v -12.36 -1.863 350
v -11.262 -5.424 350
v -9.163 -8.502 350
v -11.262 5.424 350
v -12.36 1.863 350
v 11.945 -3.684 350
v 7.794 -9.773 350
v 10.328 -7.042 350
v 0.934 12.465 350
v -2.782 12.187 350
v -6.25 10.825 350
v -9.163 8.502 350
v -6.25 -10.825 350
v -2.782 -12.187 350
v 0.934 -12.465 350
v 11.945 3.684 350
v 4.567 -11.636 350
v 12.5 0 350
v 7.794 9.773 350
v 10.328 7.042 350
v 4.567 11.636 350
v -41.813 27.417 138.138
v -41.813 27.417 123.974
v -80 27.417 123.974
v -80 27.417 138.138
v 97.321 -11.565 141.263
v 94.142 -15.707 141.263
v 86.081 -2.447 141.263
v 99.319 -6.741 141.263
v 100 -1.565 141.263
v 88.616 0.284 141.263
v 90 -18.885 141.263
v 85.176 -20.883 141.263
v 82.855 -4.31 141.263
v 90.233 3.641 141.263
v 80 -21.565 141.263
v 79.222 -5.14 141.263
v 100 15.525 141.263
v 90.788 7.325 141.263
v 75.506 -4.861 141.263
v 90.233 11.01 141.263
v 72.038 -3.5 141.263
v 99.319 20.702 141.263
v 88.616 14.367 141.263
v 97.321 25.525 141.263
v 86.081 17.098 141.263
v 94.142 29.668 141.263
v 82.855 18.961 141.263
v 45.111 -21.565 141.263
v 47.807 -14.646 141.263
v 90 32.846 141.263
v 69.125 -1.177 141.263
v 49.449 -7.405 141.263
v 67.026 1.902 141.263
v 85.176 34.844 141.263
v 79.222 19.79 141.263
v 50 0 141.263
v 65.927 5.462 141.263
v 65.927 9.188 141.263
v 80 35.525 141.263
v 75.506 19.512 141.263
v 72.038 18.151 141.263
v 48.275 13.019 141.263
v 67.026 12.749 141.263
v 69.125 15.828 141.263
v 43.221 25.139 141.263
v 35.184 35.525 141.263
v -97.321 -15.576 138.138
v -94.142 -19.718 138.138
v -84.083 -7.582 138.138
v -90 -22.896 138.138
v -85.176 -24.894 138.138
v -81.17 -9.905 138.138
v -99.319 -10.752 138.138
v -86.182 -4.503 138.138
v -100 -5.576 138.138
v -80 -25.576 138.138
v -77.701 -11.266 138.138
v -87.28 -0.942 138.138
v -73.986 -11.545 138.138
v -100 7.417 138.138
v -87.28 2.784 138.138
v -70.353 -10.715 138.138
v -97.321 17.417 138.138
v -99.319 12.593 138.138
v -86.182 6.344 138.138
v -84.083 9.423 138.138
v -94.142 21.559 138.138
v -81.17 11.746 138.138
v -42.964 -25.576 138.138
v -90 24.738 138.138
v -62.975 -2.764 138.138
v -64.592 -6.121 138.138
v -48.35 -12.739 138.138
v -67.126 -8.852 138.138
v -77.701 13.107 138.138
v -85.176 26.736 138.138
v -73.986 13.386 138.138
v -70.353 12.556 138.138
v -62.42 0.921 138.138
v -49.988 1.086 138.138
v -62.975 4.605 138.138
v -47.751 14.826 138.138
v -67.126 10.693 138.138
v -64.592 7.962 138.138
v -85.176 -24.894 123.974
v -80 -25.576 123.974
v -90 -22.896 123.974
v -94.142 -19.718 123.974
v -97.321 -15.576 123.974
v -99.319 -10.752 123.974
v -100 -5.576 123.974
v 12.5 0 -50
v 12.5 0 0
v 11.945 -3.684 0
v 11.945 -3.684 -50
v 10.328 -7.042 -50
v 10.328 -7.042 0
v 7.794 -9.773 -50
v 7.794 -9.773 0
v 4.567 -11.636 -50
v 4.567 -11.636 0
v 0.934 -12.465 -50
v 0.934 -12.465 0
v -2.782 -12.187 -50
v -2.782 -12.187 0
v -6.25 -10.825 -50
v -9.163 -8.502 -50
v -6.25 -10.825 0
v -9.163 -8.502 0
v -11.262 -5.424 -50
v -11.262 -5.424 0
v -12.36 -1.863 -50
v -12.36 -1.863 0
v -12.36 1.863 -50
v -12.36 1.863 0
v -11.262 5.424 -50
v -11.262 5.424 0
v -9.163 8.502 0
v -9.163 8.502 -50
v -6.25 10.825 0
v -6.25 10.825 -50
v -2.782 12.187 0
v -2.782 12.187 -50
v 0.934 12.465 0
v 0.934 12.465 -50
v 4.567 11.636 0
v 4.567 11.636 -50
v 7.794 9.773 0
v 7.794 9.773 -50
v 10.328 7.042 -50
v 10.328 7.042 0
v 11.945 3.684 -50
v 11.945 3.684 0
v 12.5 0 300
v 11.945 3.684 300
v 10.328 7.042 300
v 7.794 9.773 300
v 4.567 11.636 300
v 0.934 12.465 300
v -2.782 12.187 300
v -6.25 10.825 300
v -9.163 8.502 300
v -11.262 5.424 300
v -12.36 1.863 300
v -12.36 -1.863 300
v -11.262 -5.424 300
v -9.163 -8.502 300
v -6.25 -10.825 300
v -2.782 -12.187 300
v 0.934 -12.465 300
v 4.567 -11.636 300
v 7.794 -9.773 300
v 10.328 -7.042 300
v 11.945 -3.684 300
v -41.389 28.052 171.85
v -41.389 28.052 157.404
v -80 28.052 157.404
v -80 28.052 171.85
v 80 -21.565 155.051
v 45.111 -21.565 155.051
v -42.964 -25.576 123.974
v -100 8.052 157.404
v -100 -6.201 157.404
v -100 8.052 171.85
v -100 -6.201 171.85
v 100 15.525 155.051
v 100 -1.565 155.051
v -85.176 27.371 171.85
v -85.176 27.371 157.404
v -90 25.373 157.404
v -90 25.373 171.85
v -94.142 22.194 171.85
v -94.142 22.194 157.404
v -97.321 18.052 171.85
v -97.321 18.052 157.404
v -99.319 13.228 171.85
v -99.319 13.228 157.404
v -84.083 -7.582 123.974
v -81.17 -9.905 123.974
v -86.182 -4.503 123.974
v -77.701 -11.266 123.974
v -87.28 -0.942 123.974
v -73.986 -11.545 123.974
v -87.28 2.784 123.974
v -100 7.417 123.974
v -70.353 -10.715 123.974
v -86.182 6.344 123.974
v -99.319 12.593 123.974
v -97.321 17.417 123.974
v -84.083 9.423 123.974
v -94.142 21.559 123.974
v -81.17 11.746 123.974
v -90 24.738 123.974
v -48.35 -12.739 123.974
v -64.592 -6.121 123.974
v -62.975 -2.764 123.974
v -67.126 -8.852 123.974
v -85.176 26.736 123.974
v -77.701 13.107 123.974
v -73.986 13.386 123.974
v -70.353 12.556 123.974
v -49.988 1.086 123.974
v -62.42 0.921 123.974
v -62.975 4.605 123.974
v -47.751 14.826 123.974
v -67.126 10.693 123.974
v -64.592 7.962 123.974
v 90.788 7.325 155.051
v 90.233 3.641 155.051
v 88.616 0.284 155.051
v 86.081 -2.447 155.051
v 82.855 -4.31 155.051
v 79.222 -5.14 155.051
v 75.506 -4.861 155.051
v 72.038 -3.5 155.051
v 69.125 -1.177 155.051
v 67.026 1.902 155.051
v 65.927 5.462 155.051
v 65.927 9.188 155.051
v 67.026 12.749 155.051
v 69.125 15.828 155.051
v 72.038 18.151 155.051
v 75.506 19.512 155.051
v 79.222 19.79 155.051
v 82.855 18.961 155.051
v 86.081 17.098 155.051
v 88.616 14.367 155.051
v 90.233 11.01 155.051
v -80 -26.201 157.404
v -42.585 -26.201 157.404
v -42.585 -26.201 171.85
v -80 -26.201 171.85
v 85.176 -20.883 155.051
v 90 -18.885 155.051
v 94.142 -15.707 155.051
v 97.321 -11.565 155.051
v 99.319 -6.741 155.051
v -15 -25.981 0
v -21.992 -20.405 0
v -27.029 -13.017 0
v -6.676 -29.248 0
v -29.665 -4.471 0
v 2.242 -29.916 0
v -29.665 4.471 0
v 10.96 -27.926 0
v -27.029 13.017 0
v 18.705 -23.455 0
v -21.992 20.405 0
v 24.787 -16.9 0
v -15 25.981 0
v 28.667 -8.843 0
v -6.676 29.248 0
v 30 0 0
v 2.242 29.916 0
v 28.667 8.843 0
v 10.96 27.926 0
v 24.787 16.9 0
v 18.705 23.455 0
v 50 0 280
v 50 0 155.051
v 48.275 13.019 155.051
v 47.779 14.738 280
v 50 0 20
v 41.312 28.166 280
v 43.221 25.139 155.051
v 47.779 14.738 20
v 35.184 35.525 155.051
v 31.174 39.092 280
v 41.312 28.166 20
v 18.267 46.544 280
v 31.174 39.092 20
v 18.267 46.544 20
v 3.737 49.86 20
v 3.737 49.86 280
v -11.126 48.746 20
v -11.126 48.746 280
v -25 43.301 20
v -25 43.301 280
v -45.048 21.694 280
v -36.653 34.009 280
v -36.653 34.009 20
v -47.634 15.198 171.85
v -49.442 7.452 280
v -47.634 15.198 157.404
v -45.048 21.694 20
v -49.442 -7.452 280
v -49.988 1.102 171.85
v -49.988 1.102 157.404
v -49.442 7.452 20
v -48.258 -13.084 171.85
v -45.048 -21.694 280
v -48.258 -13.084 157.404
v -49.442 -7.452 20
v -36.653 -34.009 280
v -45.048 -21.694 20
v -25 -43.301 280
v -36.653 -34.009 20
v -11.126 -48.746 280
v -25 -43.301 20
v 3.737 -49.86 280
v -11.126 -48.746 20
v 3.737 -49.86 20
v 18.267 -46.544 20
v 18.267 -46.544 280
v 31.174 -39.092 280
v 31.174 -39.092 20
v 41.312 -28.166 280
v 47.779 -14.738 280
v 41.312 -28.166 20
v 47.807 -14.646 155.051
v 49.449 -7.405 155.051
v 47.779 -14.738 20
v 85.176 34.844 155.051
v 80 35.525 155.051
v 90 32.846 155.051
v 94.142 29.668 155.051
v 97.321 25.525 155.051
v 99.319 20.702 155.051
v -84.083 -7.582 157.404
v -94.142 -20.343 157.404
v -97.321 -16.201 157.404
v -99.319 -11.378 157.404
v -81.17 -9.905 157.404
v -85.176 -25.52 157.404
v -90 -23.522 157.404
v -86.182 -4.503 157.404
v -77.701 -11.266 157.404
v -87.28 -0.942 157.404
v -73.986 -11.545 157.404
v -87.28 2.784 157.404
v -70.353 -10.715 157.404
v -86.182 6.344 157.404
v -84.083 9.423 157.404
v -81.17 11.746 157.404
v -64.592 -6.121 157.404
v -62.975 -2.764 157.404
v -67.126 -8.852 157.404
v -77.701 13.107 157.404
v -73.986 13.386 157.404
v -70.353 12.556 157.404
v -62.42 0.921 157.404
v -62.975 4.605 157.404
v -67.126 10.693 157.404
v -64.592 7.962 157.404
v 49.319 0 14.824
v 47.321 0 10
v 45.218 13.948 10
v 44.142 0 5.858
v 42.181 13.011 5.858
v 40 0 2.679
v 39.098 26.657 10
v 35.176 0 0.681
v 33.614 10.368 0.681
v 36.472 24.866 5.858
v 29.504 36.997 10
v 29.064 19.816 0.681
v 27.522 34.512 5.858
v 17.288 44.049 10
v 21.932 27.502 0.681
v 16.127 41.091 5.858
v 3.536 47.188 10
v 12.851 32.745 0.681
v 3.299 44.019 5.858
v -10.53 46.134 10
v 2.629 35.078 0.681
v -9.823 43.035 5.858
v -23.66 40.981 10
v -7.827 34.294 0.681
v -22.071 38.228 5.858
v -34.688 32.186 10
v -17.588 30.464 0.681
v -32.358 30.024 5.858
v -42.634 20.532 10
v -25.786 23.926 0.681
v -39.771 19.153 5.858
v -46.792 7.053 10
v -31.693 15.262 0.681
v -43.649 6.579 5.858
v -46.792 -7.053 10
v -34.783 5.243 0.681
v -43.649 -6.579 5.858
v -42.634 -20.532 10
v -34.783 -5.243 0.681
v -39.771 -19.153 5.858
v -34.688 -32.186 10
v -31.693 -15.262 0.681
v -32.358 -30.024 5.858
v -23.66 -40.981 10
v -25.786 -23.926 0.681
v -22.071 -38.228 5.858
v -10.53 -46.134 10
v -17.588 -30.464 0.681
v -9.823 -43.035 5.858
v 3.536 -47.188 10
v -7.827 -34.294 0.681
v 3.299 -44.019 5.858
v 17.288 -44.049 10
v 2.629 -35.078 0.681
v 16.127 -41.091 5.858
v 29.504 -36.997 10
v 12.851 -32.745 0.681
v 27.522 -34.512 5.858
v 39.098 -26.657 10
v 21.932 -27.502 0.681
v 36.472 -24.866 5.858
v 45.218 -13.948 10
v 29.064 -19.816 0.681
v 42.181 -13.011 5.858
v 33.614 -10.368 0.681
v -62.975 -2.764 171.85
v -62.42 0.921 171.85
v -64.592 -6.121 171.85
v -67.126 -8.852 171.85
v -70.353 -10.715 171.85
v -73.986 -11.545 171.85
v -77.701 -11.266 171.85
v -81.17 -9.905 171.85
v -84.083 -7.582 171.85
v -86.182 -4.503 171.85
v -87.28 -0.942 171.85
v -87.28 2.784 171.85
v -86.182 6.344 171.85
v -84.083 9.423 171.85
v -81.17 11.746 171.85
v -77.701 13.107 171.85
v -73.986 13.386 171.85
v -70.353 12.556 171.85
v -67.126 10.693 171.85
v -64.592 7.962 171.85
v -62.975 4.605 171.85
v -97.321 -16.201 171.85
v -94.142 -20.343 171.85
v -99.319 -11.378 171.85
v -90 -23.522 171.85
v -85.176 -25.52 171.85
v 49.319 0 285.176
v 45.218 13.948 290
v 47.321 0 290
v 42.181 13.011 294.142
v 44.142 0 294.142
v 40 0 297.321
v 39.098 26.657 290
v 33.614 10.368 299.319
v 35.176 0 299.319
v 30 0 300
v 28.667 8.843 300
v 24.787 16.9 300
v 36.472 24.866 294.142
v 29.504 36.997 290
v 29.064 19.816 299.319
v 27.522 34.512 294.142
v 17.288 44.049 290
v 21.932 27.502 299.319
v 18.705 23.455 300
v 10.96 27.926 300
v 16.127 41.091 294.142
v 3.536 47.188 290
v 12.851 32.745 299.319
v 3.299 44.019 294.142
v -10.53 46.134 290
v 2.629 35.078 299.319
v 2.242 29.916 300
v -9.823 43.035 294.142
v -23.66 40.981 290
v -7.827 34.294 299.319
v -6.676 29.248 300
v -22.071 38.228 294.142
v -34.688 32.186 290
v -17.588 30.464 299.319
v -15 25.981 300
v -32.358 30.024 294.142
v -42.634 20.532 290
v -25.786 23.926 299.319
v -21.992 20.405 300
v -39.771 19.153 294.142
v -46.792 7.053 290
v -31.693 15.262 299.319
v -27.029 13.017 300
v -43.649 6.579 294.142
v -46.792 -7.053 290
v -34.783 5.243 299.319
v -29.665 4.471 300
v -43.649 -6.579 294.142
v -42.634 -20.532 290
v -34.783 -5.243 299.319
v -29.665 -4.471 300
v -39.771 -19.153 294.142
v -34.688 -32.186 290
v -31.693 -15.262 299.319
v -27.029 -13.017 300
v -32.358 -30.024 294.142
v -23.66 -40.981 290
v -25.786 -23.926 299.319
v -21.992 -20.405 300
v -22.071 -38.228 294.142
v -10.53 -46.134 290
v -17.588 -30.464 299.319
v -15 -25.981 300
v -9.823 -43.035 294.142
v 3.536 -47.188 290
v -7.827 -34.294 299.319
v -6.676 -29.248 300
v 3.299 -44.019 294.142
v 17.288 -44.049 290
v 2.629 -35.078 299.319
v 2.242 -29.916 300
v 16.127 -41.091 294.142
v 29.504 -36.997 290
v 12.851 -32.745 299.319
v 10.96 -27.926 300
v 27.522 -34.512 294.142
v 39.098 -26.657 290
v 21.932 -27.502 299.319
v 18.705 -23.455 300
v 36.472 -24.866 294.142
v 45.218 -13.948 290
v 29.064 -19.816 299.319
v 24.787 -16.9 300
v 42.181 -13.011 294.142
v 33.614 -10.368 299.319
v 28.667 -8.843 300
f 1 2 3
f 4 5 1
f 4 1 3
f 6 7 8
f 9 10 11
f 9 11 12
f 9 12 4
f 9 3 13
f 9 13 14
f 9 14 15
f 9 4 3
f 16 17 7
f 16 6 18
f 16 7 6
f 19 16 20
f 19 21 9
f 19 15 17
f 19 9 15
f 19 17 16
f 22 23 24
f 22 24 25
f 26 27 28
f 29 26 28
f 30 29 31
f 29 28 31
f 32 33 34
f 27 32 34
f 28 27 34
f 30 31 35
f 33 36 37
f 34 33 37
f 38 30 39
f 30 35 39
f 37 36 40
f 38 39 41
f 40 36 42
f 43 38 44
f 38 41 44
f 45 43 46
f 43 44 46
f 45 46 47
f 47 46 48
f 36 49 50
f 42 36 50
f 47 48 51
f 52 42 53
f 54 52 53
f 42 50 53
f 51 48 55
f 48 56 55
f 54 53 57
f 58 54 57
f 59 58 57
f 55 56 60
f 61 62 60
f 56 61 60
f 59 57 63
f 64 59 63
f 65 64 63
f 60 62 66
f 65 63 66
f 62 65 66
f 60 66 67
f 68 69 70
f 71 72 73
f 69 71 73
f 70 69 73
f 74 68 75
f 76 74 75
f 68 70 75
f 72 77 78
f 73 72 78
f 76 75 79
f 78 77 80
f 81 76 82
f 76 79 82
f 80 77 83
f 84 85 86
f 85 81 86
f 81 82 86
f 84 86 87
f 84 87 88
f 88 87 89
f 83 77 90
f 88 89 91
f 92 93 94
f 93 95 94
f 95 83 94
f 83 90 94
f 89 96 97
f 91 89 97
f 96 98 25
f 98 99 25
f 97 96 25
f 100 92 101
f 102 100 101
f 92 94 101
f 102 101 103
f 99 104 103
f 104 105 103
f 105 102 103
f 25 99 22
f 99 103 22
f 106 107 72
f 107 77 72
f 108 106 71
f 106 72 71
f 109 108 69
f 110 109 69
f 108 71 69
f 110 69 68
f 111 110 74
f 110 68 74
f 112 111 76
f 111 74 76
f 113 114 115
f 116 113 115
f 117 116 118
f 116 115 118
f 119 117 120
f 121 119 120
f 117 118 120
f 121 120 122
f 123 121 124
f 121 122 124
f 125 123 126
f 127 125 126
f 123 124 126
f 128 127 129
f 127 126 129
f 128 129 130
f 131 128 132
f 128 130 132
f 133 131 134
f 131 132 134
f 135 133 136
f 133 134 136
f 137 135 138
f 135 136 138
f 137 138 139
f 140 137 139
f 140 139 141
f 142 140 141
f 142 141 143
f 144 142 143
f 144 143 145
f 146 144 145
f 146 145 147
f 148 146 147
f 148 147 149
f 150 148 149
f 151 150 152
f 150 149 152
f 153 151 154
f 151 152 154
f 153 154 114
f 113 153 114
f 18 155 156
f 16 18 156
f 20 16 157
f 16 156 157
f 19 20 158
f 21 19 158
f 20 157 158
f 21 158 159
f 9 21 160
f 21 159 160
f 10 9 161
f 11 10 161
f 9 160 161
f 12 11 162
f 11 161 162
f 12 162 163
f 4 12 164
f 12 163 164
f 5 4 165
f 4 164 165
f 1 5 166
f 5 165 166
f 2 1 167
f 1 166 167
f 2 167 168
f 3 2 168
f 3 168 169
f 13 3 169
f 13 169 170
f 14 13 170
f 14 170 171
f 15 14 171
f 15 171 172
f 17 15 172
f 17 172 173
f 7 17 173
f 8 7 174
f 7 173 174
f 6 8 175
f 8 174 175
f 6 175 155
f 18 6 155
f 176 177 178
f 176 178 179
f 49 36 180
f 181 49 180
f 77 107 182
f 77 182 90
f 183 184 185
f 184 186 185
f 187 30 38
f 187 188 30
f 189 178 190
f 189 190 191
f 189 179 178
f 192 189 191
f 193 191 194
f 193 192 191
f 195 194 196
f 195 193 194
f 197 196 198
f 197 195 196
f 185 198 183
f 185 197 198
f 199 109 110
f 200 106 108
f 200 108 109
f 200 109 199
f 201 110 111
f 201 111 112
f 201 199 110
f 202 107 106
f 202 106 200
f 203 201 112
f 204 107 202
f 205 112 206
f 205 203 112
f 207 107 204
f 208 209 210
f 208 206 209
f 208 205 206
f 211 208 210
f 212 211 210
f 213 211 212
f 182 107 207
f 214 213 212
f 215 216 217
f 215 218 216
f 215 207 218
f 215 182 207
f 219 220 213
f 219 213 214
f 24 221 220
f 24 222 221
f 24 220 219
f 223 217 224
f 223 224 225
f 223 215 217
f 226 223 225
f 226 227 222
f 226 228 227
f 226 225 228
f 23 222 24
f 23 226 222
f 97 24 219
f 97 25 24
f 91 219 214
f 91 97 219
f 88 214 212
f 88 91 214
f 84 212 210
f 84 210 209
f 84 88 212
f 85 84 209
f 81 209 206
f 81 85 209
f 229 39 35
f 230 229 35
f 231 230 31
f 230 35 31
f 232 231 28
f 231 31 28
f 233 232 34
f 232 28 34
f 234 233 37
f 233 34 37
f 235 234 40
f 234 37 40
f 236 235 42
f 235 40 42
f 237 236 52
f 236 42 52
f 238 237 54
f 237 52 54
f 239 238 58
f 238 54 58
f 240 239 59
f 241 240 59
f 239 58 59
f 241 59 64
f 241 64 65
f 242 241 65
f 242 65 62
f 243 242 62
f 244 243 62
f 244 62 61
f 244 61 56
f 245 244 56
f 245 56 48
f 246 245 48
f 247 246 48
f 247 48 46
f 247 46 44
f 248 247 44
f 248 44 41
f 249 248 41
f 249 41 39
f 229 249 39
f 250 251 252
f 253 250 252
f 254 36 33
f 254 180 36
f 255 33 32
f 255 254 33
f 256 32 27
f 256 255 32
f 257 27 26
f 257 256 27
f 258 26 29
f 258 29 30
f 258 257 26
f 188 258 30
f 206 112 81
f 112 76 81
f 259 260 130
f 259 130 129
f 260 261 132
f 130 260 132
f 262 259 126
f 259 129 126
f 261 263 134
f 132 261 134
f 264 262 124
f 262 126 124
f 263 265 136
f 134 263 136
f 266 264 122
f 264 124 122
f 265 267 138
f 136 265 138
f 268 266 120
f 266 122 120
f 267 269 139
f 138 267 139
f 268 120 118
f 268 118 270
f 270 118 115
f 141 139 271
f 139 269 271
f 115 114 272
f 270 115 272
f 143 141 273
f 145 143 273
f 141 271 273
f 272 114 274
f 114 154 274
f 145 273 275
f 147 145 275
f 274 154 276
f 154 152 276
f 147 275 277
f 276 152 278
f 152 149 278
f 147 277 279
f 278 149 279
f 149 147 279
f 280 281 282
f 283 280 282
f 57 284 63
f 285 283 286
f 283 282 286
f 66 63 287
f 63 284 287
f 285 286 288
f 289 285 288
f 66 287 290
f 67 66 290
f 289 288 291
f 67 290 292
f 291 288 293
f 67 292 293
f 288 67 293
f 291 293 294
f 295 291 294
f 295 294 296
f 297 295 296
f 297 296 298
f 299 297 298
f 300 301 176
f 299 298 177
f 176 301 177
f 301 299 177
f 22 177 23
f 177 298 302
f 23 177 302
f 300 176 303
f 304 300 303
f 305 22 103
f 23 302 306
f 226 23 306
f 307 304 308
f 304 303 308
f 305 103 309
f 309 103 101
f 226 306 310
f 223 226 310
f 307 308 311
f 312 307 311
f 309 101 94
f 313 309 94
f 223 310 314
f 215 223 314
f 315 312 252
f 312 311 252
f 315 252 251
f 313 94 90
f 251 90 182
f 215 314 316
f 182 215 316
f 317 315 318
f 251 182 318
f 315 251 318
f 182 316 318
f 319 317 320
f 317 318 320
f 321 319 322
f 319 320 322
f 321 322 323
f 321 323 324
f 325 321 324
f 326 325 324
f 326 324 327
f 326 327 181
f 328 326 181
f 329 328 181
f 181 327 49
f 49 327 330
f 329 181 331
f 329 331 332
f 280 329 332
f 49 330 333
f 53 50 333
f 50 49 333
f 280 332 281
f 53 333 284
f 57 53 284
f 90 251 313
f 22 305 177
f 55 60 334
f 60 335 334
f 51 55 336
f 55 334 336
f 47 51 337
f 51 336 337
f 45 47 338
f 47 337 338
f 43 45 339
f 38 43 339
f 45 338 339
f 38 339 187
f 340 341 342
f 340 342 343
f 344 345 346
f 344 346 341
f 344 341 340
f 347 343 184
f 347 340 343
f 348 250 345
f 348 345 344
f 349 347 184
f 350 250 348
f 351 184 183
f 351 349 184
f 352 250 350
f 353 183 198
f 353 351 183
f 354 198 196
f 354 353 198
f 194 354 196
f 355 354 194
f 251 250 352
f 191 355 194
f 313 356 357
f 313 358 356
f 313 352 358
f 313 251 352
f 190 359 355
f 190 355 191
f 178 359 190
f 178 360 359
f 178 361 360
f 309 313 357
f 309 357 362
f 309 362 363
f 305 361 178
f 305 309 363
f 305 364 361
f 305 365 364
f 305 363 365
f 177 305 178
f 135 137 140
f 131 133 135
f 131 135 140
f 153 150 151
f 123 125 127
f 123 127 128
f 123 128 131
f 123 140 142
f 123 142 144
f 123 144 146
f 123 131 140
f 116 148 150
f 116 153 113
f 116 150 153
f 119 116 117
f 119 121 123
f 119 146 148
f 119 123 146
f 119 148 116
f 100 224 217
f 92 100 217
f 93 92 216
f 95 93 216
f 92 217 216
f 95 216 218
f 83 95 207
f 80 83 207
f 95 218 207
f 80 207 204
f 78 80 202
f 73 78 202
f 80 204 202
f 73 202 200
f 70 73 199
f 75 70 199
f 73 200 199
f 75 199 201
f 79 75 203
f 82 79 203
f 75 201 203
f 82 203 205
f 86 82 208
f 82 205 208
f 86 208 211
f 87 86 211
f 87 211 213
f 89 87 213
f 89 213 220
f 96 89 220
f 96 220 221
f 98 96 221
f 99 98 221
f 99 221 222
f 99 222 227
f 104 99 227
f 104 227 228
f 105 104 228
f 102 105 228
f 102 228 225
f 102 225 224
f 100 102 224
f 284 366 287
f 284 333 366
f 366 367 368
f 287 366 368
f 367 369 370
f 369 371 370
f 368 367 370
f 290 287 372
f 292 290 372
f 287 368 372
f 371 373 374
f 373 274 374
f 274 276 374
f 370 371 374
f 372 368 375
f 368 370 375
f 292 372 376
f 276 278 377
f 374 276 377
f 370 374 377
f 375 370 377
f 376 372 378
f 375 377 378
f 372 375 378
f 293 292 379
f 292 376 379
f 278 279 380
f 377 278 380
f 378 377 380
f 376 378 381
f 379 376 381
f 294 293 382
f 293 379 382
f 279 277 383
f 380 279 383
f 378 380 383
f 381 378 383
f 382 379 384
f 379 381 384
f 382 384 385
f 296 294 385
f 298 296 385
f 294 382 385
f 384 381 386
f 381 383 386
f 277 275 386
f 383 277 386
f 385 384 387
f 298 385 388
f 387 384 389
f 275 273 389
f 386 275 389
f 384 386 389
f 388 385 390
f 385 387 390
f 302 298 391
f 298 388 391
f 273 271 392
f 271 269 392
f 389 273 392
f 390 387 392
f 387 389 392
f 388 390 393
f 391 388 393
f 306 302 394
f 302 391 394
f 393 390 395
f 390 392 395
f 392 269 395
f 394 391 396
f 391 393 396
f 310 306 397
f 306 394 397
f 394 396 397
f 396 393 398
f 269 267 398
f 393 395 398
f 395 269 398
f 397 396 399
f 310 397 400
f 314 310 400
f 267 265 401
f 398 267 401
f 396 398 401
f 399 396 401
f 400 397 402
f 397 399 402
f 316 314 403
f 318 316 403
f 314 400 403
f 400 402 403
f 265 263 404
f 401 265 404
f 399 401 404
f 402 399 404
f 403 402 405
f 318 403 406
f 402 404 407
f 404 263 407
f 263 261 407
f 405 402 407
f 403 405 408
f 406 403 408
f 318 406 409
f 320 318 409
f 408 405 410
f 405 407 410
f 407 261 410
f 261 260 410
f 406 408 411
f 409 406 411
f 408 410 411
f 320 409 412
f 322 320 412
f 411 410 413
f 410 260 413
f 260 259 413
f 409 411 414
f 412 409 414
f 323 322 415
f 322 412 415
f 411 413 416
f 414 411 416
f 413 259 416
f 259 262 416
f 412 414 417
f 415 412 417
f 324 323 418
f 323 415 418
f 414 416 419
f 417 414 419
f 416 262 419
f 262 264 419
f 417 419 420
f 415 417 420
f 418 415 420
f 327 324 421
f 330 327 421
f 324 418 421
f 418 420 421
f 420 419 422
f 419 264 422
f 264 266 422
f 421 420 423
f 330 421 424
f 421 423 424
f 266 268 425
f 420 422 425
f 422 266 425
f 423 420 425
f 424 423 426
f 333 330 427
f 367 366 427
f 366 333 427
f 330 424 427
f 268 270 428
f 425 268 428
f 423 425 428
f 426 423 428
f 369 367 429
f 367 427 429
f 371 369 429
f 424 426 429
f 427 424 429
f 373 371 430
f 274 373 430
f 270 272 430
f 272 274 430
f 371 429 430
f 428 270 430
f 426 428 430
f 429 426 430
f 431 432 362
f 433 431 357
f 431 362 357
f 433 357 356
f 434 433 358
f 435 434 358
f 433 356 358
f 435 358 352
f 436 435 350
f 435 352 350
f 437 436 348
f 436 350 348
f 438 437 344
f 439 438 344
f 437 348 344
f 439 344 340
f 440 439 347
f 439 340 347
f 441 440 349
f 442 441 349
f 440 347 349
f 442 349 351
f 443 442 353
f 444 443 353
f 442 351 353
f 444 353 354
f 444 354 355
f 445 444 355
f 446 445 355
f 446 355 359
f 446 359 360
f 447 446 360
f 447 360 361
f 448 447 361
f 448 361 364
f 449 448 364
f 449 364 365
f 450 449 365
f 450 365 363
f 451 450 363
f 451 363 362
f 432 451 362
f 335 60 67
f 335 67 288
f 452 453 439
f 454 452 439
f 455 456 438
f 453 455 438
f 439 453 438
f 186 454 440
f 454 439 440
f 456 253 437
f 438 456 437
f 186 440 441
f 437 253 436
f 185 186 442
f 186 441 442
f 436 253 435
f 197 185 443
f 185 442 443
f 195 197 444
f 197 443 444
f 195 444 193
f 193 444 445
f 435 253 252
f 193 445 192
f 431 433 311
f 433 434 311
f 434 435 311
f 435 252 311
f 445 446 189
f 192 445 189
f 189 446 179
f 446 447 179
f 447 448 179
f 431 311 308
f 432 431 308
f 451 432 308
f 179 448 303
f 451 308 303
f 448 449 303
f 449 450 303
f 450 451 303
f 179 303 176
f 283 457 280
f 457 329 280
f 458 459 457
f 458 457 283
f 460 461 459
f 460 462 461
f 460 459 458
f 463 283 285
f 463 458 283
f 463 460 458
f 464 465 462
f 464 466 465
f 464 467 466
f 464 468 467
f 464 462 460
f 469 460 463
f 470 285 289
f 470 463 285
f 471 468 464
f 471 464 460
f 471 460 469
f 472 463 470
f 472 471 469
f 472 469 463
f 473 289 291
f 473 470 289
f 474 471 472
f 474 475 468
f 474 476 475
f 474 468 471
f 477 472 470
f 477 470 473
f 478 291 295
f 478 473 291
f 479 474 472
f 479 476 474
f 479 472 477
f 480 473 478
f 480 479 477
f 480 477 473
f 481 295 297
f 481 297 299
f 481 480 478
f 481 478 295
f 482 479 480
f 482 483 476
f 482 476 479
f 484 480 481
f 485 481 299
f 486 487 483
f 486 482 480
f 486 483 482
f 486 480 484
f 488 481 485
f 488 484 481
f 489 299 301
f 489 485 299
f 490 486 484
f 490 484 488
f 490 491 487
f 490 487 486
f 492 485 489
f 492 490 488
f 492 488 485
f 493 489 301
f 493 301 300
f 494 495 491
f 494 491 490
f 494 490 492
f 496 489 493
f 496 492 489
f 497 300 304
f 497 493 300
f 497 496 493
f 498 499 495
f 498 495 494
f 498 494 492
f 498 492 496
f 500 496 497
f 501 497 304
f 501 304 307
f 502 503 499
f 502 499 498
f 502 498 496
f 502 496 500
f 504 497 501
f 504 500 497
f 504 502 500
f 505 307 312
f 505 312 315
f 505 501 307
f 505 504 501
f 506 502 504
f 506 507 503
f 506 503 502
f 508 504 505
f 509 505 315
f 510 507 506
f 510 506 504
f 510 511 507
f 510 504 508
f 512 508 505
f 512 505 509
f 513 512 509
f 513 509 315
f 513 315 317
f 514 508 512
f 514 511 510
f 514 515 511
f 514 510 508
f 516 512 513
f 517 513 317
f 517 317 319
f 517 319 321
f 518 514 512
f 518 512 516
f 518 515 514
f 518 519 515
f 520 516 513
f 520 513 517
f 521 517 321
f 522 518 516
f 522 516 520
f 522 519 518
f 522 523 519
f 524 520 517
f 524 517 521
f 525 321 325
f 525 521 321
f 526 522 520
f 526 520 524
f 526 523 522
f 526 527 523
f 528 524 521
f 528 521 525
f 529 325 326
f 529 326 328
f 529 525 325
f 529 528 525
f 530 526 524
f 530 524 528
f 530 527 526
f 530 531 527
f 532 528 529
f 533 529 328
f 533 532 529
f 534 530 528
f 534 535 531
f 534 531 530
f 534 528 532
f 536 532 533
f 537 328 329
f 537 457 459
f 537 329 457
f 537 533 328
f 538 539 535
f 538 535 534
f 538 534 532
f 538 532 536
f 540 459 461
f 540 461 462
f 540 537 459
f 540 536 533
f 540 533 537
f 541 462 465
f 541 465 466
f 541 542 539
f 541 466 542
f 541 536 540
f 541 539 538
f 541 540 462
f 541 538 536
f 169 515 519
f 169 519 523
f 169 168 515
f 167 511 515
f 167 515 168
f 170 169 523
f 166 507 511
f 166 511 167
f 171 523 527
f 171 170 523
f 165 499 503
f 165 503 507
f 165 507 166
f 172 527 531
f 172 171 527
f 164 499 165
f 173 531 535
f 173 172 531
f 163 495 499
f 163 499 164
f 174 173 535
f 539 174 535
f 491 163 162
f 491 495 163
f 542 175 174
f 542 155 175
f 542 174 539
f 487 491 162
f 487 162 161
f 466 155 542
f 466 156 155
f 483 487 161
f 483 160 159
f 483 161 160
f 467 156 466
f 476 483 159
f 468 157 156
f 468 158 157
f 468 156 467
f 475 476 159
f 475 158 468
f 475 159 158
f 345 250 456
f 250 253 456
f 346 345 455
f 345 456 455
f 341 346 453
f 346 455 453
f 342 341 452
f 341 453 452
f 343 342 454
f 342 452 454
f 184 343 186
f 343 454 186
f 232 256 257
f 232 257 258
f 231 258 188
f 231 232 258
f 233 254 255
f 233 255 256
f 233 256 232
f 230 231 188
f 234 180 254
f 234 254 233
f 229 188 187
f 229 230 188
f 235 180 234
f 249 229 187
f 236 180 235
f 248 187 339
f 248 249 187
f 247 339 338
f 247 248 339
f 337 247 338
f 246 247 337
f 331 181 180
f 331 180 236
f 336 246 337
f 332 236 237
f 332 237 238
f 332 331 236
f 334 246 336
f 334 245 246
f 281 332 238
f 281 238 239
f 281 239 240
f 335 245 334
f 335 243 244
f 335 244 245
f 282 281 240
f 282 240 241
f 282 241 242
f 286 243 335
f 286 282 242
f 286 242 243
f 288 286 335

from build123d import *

# Parameters (mm, degrees)
F0_R      = 50
F1_DEPTH  = 300
F2_W      = 54.253433831
F2_H      = 14.4457370043
F2_W_2    = 52.9929734766
F2_H_2    = 14.163993299
F3_DEPTH  = 100
F4_W      = 57.0899797603
F4_H      = 13.7881338596
F5_DEPTH  = 100
F6_R      = 12.5
F7_DEPTH  = 158.7383495102
F8_R      = 12.5
F9_DEPTH  = 176.0267437825
F10_R     = 20
F11_R     = 20
F12_R     = 12.5
F13_DEPTH = 50
F14_R     = 12.5
F15_DEPTH = 50


with BuildPart() as f1:
    # F0 (on Top) → F1 (new body)
    with BuildSketch(Plane.XY):
        Circle(F0_R)
    extrude(amount=F1_DEPTH)

    # F2 (on Right) → F3 (join)
    with BuildSketch(Plane.YZ):
        with Locations((0.9253951721, 164.6268591285)):
            Rectangle(F2_W, F2_H)
        with Locations((0.9205453098, 131.056252867)):
            Rectangle(F2_W_2, F2_H_2)
    extrude(amount=-F3_DEPTH)

    # F4 (on Right) → F5 (join)
    with BuildSketch(Plane.YZ):
        with Locations((6.9804289378, 148.1567174196)):
            Rectangle(F4_W, F4_H)
    extrude(amount=F5_DEPTH)

    # F6 (on face) → F7 (cut, through all)
    with BuildSketch(Plane(origin=(0, 0, 141.2626504898), x_dir=(1, 0, 0), z_dir=(0, 0, -1))):
        with Locations((78.2878473401, -7.3254397139)):
            Circle(F6_R)
    extrude(amount=-F7_DEPTH, mode=Mode.SUBTRACT)

    # F8 (on face) → F9 (cut, through all)
    with BuildSketch(Plane(origin=(0, 0, 123.9742562175), x_dir=(1, 0, 0), z_dir=(0, 0, -1))):
        with Locations((-74.919745326, -0.9205453098)):
            Circle(F8_R)
    extrude(amount=-F9_DEPTH, mode=Mode.SUBTRACT)

    # F10
    f10_edges = [f1.edges().sort_by_distance(p)[0] for p in [
        (-50, 0, 300),
        (-50, 0, 0),
    ]]
    fillet(f10_edges, radius=F10_R)

    # F11
    f11_edges = [f1.edges().sort_by_distance(p)[0] for p in [
        (100, 35.525419, 148.156717),
        (100, -21.564561, 148.156717),
        (-100, -25.575941, 131.056253),
        (-100, 27.417032, 131.056253),
        (-100, -26.201322, 164.626859),
        (-100, 28.052112, 164.626859),
    ]]
    fillet(f11_edges, radius=F11_R)

    # F12 (on face) → F13 (join)
    with BuildSketch(Plane.XY.offset(300)):
        Circle(F12_R)
    extrude(amount=F13_DEPTH)

    # F14 (on face) → F15 (join)
    with BuildSketch(Plane(origin=(0, 0, 0), x_dir=(1, 0, 0), z_dir=(0, 0, -1))):
        Circle(F14_R)
    extrude(amount=F15_DEPTH)


solid = f1.part
